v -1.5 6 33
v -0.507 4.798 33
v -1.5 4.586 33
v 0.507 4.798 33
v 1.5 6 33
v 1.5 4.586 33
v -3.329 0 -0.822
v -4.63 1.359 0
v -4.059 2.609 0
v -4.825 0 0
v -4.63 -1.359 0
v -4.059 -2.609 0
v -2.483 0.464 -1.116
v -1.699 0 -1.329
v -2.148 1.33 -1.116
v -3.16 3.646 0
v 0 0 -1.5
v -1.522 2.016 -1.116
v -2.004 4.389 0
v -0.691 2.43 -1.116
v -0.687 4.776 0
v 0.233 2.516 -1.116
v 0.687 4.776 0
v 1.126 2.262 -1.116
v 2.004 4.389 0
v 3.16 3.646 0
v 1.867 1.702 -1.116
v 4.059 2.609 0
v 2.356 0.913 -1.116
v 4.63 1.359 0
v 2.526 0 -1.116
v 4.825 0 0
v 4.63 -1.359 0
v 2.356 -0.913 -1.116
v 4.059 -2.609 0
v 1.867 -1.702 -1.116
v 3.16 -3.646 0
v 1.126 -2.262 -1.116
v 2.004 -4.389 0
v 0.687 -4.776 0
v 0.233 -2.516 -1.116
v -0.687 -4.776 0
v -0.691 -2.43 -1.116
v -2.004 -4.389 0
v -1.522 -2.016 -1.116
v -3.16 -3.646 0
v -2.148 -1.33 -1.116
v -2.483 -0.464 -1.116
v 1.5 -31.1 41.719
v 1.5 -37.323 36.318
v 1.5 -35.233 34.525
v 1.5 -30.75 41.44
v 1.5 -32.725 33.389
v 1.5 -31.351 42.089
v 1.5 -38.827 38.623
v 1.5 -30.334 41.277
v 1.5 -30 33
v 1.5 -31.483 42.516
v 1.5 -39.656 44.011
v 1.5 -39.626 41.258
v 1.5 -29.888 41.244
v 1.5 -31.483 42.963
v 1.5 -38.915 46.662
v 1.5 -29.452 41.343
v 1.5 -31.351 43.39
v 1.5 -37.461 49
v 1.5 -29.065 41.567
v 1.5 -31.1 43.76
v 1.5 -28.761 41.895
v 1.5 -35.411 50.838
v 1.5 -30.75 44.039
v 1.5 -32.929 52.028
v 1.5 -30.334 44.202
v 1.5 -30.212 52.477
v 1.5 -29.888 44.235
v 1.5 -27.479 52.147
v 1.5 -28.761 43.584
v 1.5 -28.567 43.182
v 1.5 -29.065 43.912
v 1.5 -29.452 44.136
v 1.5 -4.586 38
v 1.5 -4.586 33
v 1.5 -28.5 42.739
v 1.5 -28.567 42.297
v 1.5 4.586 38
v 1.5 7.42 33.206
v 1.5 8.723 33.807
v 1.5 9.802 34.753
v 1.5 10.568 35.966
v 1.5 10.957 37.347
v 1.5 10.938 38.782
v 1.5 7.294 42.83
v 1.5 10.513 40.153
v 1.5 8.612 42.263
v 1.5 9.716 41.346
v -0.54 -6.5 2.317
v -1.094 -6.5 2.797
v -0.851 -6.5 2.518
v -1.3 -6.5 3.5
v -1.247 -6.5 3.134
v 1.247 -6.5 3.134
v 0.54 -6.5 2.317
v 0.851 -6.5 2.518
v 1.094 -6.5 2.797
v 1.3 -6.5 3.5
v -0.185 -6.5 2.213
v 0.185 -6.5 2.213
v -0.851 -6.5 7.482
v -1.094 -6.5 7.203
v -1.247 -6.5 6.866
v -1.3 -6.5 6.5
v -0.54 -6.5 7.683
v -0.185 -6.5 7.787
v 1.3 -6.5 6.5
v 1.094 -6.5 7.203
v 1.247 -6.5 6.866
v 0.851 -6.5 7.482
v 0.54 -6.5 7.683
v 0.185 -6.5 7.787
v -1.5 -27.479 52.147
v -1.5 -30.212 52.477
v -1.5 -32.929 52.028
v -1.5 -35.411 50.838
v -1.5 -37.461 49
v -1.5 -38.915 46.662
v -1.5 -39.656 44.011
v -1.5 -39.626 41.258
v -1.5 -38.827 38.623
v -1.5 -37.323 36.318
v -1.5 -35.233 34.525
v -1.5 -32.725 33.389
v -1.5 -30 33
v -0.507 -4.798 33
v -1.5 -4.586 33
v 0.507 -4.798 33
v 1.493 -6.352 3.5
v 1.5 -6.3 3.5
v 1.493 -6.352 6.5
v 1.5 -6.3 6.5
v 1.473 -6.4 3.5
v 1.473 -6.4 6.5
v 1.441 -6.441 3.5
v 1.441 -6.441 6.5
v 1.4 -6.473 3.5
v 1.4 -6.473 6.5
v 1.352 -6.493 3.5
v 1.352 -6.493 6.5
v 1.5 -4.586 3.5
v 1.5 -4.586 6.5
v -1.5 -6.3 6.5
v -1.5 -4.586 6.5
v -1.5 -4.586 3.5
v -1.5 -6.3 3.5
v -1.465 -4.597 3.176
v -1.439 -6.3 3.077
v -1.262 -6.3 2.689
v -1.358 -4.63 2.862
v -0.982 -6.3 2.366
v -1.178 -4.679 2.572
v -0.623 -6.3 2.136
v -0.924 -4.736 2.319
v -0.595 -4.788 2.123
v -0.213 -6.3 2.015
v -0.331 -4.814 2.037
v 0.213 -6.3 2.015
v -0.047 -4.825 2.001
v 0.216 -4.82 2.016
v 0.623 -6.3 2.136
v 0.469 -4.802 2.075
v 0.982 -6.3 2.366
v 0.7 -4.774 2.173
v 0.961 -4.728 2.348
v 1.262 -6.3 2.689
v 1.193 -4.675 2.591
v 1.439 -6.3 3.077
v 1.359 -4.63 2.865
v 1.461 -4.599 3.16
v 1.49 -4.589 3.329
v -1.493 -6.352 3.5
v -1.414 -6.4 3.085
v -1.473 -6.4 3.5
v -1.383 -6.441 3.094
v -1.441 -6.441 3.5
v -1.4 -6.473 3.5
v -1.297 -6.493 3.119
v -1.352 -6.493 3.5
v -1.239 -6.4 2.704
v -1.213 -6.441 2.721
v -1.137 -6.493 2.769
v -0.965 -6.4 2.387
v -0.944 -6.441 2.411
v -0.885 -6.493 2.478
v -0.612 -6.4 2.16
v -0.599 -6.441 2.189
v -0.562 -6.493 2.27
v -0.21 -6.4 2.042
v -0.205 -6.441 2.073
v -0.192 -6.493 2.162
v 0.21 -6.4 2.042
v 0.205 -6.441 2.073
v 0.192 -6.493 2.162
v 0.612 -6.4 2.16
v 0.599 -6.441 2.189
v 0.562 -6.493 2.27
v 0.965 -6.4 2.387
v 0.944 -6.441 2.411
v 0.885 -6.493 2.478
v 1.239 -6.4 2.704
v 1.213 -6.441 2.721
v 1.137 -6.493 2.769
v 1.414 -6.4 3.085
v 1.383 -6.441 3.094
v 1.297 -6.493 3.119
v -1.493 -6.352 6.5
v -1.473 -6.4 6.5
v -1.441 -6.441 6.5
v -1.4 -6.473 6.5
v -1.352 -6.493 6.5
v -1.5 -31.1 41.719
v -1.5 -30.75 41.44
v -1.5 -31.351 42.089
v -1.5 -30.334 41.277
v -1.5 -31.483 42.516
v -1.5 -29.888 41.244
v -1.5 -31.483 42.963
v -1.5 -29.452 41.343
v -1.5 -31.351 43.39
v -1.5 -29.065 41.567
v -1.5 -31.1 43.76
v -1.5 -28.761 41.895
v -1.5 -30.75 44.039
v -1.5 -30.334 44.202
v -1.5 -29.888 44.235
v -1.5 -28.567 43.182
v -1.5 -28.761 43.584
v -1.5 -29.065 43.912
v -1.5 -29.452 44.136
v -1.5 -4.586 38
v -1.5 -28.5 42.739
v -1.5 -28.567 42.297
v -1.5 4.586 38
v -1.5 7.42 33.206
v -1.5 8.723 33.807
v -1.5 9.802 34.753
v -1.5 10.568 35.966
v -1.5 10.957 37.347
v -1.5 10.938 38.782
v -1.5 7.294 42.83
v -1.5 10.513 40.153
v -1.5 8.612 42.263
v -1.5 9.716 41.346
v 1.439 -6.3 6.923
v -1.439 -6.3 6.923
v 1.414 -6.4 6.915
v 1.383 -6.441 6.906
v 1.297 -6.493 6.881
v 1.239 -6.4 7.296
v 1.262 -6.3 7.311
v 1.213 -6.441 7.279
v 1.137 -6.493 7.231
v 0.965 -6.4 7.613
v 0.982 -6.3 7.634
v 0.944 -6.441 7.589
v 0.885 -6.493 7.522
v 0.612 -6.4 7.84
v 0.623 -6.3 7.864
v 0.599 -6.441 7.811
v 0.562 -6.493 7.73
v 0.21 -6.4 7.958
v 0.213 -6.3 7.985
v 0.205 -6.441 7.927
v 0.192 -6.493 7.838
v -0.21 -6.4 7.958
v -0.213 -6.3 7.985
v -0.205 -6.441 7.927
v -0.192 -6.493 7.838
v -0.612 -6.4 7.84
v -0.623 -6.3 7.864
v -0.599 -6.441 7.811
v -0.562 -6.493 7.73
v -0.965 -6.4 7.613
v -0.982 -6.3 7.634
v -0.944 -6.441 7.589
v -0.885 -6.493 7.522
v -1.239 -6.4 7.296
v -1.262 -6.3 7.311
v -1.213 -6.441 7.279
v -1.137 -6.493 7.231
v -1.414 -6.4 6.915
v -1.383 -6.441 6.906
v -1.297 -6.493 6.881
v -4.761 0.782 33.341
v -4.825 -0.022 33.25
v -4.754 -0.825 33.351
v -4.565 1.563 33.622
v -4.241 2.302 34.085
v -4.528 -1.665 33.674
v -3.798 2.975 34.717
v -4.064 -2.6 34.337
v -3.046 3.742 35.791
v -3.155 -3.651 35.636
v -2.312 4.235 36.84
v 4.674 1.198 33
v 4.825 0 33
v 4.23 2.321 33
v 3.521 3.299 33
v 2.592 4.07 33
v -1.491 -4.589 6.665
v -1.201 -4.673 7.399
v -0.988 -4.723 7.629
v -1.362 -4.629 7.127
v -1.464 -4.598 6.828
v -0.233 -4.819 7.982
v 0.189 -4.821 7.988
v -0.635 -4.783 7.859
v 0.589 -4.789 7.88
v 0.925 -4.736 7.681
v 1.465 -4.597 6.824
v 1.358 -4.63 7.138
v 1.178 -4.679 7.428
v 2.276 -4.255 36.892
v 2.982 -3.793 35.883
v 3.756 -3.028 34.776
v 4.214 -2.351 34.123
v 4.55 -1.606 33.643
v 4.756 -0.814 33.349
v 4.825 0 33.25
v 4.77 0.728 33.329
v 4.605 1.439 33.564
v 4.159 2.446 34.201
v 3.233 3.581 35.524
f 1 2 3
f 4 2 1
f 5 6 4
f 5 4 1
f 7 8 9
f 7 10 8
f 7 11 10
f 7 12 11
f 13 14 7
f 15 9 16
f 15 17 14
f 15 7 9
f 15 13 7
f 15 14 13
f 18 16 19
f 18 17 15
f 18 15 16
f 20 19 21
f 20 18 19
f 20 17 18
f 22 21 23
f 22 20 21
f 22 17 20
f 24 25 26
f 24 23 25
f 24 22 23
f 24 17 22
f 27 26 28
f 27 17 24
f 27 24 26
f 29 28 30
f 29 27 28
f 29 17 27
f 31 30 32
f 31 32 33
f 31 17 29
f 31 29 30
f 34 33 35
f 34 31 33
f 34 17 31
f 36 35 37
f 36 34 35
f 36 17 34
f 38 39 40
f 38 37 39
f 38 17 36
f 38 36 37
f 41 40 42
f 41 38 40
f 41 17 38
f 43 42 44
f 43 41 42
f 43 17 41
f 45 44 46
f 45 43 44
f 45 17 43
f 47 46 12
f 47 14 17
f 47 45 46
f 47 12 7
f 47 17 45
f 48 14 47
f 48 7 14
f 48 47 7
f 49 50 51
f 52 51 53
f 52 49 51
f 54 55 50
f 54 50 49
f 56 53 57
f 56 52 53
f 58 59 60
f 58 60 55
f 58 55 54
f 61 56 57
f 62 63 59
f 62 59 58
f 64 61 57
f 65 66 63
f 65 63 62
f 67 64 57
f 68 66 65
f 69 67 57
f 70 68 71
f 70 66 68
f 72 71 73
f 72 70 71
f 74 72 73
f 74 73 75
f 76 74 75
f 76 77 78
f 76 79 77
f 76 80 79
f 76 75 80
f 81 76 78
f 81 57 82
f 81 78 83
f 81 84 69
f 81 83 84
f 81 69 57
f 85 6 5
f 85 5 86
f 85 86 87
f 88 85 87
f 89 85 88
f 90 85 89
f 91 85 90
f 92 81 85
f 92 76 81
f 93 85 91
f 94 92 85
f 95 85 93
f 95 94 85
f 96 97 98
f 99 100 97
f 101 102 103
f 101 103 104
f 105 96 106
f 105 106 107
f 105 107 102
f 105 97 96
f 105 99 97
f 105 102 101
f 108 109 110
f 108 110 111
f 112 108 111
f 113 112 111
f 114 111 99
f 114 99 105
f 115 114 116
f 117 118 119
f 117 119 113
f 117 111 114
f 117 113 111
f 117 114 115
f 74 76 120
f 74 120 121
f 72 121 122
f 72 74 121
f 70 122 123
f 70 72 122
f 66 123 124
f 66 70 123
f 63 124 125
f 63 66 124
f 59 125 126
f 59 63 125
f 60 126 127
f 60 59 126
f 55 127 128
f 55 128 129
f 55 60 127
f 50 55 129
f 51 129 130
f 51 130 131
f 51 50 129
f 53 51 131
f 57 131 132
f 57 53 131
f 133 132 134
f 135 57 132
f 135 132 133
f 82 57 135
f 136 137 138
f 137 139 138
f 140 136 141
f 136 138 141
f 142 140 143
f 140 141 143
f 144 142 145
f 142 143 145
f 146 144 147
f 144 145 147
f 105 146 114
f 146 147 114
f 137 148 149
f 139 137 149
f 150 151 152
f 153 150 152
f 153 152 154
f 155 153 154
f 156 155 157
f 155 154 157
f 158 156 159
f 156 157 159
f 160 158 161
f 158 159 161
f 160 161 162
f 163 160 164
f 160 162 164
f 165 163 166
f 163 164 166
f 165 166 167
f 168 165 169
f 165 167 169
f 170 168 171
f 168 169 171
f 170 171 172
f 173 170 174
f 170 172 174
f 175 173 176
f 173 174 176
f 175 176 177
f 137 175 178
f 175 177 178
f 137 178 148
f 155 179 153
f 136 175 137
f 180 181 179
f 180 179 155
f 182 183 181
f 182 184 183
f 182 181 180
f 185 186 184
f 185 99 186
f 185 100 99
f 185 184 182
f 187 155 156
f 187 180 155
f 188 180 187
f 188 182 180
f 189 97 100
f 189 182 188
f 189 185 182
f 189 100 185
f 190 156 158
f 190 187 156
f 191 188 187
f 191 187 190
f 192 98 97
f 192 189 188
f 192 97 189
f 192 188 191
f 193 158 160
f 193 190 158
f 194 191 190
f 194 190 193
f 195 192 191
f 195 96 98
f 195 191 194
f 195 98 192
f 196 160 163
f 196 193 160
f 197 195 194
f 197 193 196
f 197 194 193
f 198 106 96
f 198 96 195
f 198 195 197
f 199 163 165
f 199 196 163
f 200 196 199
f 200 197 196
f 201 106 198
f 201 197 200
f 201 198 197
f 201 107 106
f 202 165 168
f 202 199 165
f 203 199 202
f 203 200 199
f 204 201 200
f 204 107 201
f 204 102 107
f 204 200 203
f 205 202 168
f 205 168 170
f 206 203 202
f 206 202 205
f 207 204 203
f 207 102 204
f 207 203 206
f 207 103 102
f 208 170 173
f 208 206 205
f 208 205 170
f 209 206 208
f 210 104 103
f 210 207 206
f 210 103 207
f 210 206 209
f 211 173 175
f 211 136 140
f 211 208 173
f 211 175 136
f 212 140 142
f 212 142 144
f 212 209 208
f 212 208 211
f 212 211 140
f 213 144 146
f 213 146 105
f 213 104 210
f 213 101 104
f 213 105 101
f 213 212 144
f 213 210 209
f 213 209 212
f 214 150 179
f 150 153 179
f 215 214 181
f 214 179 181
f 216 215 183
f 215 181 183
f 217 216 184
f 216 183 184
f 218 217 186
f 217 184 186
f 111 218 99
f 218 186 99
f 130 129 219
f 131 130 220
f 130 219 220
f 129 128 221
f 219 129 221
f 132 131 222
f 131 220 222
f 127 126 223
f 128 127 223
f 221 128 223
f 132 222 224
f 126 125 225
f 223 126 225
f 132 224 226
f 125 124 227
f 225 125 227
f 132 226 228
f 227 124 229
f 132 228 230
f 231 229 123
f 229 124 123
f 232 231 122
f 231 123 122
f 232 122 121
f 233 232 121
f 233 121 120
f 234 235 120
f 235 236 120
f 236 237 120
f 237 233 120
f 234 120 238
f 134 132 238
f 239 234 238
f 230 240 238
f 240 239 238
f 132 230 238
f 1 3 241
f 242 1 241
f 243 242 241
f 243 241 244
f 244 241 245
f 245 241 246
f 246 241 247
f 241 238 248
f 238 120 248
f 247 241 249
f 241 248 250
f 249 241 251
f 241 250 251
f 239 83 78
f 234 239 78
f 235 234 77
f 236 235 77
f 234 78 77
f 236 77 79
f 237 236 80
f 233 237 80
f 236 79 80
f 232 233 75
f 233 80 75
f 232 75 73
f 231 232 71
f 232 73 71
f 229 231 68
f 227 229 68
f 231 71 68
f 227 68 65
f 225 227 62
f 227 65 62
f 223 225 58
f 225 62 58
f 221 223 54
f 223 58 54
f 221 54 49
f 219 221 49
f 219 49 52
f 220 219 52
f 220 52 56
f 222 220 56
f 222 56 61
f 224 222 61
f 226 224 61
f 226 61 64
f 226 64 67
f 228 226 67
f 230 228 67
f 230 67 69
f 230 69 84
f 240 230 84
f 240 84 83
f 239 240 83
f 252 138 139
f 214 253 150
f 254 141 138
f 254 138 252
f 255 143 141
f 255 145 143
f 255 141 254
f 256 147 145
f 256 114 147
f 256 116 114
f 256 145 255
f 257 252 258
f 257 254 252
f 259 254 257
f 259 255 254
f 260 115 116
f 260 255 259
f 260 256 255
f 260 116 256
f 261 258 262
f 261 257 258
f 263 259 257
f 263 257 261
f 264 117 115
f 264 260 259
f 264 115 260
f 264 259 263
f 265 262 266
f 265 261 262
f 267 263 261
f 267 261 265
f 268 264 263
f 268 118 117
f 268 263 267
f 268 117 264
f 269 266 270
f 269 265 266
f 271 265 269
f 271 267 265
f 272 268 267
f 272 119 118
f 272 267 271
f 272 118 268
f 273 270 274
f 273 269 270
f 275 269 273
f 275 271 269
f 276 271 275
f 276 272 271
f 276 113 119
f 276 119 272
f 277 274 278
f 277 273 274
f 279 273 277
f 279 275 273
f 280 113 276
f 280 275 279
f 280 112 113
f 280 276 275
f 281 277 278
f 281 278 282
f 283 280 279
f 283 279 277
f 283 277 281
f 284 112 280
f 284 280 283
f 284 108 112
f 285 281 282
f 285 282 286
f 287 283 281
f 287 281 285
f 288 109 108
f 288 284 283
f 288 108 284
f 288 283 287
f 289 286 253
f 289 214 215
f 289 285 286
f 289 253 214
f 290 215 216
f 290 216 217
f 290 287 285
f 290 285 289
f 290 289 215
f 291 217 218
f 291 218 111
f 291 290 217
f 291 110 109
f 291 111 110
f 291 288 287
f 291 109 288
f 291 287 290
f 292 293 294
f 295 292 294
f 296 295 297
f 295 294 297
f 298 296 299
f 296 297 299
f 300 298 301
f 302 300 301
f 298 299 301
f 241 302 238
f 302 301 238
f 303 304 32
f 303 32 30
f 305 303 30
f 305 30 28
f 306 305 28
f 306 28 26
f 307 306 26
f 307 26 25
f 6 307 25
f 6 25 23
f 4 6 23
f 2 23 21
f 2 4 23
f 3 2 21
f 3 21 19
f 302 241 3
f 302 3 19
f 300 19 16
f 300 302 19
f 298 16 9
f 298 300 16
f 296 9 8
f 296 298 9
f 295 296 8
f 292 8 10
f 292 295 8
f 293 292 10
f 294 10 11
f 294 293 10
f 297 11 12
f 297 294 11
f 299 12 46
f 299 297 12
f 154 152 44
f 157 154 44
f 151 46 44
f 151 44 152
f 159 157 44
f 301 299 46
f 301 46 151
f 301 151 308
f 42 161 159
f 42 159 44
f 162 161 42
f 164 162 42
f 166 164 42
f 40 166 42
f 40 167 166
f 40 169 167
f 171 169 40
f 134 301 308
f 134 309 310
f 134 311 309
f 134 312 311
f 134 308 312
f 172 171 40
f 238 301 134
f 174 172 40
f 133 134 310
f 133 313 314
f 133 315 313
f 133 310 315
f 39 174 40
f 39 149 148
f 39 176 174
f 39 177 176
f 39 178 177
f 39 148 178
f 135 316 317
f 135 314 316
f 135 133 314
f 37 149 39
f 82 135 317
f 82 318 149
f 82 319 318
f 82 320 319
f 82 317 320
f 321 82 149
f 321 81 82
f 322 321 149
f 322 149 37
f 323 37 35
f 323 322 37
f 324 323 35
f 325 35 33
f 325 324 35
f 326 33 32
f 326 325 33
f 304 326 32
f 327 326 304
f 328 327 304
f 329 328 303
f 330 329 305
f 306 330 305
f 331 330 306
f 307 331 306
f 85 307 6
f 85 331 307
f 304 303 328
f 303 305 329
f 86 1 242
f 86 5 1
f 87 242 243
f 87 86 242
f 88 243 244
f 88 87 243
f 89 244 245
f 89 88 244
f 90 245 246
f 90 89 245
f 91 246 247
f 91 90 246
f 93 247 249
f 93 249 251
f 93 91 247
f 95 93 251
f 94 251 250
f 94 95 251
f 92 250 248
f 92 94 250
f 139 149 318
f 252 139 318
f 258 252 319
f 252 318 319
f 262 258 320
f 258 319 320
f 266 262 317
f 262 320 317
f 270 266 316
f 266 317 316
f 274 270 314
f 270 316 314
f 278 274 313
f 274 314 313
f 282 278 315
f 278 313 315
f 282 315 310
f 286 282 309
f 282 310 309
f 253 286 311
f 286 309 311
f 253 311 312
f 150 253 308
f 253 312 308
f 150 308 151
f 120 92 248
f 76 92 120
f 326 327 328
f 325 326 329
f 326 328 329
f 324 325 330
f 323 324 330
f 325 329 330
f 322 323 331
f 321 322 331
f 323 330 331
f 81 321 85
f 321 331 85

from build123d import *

# Parameters (mm, degrees)
F0_R          = 4.825
F1_DEPTH      = 33
F3_DEPTH      = 6.5
F4_R          = 0.2
F8_DEPTH      = 1.5
F8_DEPTH_BACK = 1.5
F9_T4_DEPTH   = 34.9974315038
F9_S5_R       = 4.825
F9_T6_DEPTH   = 19
F9_T10_DEPTH  = 34.9974315038
F9_S11_R      = 4.825
F9_T12_DEPTH  = 19
F11_R         = 1.5
F12_DEPTH     = 6.3260001


# Not quite as in the source:
# - a fillet or chamfer that OpenCascade refuses, or shapes differently, is made with other operations: its cross-section is extruded or revolved along the edge and cut away or added
# - a feature of the source that left no trace in its solid (it failed there, or was rolled back) is left out


with BuildPart() as f1:
    # F0 (on Top) → F1 (new body)
    with BuildSketch(Plane.XY):
        Circle(F0_R)
    extrude(amount=F1_DEPTH)

    # F2 (on Front) → F3 (join)
    with BuildSketch(Plane.XZ):
        with BuildLine():
            ThreePointArc((-1.5, 3.5), (0, 2), (1.5, 3.5))
            Line((1.5, 3.5), (1.5, 6.5))
            ThreePointArc((1.5, 6.5), (0, 8), (-1.5, 6.5))
            Line((-1.5, 6.5), (-1.5, 3.5))
        make_face()
    extrude(amount=F3_DEPTH)

    # F4
    f4_edges = [f1.edges().sort_by_distance(p)[0] for p in [
        (0, -6.5, 2),
        (1.5, -6.5, 5),
        (0, -6.5, 8),
        (-1.5, -6.5, 5),
    ]]
    fillet(f4_edges, radius=F4_R)

    # F5 (on Front) → F6 (revolve)
    with BuildSketch(Plane.XZ):
        with BuildLine():
            Line((0, 0), (-4.825, 0))
            ThreePointArc((-4.825, 0), (-2.5263919431, -1.1163524169), (0, -1.5))
            Line((0, -1.5), (0, 0))
        make_face()
    revolve(axis=Axis((0, 0, -1.4078605181), (0, 0, -1)))

    # F7 (on Right) → F8 (join, two sides)
    with BuildSketch(Plane.YZ) as f8_sk:
        with BuildLine():
            ThreePointArc((6, 33), (10.9572243069, 37.3473690389), (7.2940952255, 42.8296291314))
            Line((7.2940952255, 42.8296291314), (-27.4792345209, 52.1471147551))
            ThreePointArc((-27.4792345209, 52.1471147551), (-39.6561672268, 44.0107484457), (-30, 33))
            Line((-30, 33), (-6, 33))
            Line((-6, 33), (6, 33))
        make_face()
    extrude(amount=F8_DEPTH)
    extrude(f8_sk.sketch, amount=-F8_DEPTH_BACK)

    # F9: chamfer of 3.5 x 5 on 2 edges, made by hand


with BuildPart() as f9_tool2:
    # F9_s3 → F9_t4 (new body)
    with BuildSketch(Plane.XZ.offset(-17.4987157519)):
        Polygon((5, 33), (1.5, 38), (1.5, 33), align=None)
    extrude(amount=F9_T4_DEPTH)

    # F9_s5 → F9_t6 (intersect, symmetric)
    with BuildSketch(Plane.XY.offset(35.5)):
        Circle(F9_S5_R)
    extrude(amount=F9_T6_DEPTH, both=True, mode=Mode.INTERSECT)


with BuildPart() as f1_1:
    add(f1.part)

    # F9_t1: union F9_tool2
    add(f9_tool2.part)


with BuildPart() as f9_tool8:
    # F9_s9 → F9_t10 (new body)
    with BuildSketch(Plane.XZ.offset(17.4987157519)):
        Polygon((-5, 33), (-1.5, 38), (-1.5, 33), align=None)
    extrude(amount=-F9_T10_DEPTH)

    # F9_s11 → F9_t12 (intersect, symmetric)
    with BuildSketch(Plane.XY.offset(35.5)):
        Circle(F9_S11_R)
    extrude(amount=F9_T12_DEPTH, both=True, mode=Mode.INTERSECT)


with BuildPart() as f1_2:
    add(f1_1.part)

    # F9_t7: union F9_tool8
    add(f9_tool8.part)

    # F11 (on face) → F12 (cut, through all)
    with BuildSketch(Plane.YZ.offset(1.5)):
        with Locations((-30, 42.7394899131)):
            Circle(F11_R)
    extrude(amount=-F12_DEPTH, mode=Mode.SUBTRACT)


solid = f1_2.part
